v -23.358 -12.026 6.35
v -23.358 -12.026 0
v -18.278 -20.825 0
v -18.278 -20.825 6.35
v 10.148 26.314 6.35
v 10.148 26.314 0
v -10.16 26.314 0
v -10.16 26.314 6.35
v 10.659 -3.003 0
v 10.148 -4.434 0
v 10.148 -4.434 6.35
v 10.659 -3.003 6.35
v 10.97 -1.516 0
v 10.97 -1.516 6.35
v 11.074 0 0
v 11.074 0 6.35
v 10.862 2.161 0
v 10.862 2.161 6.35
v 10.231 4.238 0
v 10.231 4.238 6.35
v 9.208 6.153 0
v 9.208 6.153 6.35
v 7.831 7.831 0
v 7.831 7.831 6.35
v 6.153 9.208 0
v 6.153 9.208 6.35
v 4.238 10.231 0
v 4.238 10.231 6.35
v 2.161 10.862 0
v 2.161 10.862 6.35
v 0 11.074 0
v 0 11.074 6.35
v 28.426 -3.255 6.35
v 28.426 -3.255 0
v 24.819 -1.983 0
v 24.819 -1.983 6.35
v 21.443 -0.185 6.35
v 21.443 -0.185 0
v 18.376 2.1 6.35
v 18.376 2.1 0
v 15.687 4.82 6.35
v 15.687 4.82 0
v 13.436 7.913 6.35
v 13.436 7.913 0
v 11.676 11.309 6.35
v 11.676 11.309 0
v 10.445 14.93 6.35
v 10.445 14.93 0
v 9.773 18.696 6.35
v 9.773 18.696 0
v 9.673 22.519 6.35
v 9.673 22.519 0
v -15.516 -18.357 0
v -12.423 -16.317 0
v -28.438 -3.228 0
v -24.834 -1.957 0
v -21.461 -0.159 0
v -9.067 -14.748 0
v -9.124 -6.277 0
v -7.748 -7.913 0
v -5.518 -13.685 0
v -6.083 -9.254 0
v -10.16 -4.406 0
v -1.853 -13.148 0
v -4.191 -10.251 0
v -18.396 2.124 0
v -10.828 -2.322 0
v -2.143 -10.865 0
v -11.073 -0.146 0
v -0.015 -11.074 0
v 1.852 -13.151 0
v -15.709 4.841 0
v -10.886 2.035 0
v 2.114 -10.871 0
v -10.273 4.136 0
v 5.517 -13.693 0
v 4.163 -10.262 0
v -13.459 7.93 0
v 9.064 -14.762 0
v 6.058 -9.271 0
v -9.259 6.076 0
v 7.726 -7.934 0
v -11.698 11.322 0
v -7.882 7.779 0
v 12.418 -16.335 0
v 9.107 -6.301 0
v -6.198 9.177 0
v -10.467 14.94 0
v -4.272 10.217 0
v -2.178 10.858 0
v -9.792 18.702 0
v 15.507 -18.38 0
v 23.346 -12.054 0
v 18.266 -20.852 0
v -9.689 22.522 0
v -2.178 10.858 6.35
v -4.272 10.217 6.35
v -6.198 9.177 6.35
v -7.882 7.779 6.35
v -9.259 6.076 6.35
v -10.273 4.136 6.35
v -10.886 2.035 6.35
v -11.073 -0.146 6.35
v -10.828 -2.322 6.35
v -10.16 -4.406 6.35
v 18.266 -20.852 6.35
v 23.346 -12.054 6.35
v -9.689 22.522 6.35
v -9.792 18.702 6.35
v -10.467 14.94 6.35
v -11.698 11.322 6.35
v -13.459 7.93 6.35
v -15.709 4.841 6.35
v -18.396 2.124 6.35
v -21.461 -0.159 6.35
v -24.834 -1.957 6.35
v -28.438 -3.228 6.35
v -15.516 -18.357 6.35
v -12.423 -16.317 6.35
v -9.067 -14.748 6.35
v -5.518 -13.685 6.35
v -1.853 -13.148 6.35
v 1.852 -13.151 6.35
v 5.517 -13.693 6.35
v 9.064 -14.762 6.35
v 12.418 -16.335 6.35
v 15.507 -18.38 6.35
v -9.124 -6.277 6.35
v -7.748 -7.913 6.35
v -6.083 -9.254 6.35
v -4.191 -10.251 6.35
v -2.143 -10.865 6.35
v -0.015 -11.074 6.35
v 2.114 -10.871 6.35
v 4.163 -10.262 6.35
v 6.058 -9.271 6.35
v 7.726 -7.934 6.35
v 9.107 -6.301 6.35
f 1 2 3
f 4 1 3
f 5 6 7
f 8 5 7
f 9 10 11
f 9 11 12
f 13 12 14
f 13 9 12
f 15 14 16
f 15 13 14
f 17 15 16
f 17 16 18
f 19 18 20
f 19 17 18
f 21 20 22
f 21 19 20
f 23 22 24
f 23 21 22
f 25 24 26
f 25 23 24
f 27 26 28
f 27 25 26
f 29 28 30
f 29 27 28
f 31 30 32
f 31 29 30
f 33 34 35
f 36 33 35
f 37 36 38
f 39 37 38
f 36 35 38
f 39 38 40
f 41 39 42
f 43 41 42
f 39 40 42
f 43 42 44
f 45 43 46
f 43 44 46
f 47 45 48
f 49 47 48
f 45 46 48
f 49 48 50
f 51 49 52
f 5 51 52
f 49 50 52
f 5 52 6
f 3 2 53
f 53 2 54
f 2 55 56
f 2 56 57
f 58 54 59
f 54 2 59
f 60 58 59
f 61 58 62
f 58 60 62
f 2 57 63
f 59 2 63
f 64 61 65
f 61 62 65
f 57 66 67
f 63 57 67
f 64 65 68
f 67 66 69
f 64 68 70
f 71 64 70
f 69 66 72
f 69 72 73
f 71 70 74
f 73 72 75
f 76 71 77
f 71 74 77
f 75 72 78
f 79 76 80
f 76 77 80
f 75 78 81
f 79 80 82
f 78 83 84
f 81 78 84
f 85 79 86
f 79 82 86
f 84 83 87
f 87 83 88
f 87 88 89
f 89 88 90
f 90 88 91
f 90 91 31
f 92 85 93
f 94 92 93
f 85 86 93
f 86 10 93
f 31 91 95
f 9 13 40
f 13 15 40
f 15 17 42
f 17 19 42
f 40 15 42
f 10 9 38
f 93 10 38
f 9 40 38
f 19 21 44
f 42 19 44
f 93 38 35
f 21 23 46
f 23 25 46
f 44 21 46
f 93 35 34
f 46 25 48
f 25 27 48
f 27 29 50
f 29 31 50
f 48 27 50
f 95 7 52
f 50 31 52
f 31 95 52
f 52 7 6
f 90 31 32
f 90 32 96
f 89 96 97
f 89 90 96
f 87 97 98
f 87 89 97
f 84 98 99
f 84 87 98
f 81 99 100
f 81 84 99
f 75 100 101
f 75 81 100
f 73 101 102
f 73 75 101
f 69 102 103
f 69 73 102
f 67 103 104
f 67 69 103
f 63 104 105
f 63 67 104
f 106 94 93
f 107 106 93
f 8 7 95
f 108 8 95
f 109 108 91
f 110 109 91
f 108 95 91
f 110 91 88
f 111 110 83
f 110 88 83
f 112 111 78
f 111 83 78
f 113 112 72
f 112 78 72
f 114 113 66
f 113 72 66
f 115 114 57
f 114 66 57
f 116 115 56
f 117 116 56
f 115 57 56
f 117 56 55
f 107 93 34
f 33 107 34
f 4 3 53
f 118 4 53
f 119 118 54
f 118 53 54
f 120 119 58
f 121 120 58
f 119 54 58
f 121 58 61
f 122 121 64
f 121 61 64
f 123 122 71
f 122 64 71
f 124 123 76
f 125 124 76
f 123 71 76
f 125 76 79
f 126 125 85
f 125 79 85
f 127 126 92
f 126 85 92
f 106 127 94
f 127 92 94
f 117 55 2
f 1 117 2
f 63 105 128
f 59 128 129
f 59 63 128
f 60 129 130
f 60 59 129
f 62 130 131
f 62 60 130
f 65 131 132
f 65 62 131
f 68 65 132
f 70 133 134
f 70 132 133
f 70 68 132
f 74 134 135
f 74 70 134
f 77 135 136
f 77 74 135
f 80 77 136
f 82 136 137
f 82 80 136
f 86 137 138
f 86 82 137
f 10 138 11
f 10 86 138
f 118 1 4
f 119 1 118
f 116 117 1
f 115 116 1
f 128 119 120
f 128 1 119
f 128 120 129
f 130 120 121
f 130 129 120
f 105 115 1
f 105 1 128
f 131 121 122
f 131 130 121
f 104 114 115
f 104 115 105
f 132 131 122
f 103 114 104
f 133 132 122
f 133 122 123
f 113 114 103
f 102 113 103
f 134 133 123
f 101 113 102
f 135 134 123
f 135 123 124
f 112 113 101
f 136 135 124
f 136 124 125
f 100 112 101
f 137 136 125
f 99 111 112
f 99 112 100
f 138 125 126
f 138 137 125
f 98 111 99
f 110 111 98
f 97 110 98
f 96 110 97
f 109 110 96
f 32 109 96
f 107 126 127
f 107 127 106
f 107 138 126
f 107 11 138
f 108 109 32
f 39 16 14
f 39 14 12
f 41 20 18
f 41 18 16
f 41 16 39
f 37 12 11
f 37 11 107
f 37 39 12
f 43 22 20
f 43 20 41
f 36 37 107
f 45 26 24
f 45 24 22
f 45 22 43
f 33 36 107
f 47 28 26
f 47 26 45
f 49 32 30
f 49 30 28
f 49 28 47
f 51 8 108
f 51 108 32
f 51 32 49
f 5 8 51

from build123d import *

# Parameters (mm, degrees)
F1_DEPTH = 6.35
F2_DEPTH = 914.4


with BuildPart() as f1:
    # F0 (on Top) → F1 (new body)
    with BuildSketch(Plane.XY):
        with BuildLine():
            ThreePointArc((-10.16, -4.4064424835), (-9.2585377355, 6.0763323116), (0, 11.0744))
            Line((0, 11.0744), (0, 26.3144))
            Line((0, 26.3144), (-10.16, 26.3144))
            ThreePointArc((-10.16, 26.3144), (-13.4590659426, 7.9300363387), (-28.4382271537, -3.227624381))
            Line((-28.4382271537, -3.227624381), (-23.3582271537, -12.0264424835))
            Line((-23.3582271537, -12.0264424835), (-10.16, -4.4064424835))
        make_face()
        with BuildLine():
            ThreePointArc((10.148152514, -4.4336594269), (10.8403652051, -2.2646892899), (11.0744, 0))
            ThreePointArc((11.0744, 0), (7.8307833376, 7.8307833376), (0, 11.0744))
            ThreePointArc((0, 11.0744), (-9.2585377355, 6.0763323116), (-10.16, -4.4064424835))
            ThreePointArc((-10.16, -4.4064424835), (-0.0148418743, -11.0743900545), (10.148152514, -4.4336594269))
        make_face()
        with BuildLine():
            ThreePointArc((0, 11.0744), (7.8307833376, 7.8307833376), (11.0744, 0))
            ThreePointArc((11.0744, 0), (10.8403652051, -2.2646892899), (10.148152514, -4.4336594269))
            Line((10.148152514, -4.4336594269), (23.3463796676, -12.0536594269))
            Line((23.3463796676, -12.0536594269), (28.4263796676, -3.2548413244))
            ThreePointArc((28.4263796676, -3.2548413244), (13.4364974773, 7.9131265949), (10.148152514, 26.3144))
            Line((10.148152514, 26.3144), (0, 26.3144))
            Line((0, 26.3144), (0, 11.0744))
        make_face()
        with BuildLine():
            Line((23.3463796676, -12.0536594269), (10.148152514, -4.4336594269))
            ThreePointArc((10.148152514, -4.4336594269), (-0.0148418743, -11.0743900545), (-10.16, -4.4064424835))
            Line((-10.16, -4.4064424835), (-23.3582271537, -12.0264424835))
            Line((-23.3582271537, -12.0264424835), (-18.2782271537, -20.8252605859))
            ThreePointArc((-18.2782271537, -20.8252605859), (-0.0001467991, -13.082077915), (18.2663796676, -20.8524775293))
            Line((18.2663796676, -20.8524775293), (23.3463796676, -12.0536594269))
        make_face()
    extrude(amount=F1_DEPTH)

    # F0 (on Top) → F2 (cut)
    with BuildSketch(Plane.XY):
        with BuildLine():
            ThreePointArc((10.148152514, -4.4336594269), (10.8403652051, -2.2646892899), (11.0744, 0))
            ThreePointArc((11.0744, 0), (7.8307833376, 7.8307833376), (0, 11.0744))
            ThreePointArc((0, 11.0744), (-9.2585377355, 6.0763323116), (-10.16, -4.4064424835))
            ThreePointArc((-10.16, -4.4064424835), (-0.0148418743, -11.0743900545), (10.148152514, -4.4336594269))
        make_face()
    extrude(amount=F2_DEPTH, mode=Mode.SUBTRACT)


solid = f1.part
